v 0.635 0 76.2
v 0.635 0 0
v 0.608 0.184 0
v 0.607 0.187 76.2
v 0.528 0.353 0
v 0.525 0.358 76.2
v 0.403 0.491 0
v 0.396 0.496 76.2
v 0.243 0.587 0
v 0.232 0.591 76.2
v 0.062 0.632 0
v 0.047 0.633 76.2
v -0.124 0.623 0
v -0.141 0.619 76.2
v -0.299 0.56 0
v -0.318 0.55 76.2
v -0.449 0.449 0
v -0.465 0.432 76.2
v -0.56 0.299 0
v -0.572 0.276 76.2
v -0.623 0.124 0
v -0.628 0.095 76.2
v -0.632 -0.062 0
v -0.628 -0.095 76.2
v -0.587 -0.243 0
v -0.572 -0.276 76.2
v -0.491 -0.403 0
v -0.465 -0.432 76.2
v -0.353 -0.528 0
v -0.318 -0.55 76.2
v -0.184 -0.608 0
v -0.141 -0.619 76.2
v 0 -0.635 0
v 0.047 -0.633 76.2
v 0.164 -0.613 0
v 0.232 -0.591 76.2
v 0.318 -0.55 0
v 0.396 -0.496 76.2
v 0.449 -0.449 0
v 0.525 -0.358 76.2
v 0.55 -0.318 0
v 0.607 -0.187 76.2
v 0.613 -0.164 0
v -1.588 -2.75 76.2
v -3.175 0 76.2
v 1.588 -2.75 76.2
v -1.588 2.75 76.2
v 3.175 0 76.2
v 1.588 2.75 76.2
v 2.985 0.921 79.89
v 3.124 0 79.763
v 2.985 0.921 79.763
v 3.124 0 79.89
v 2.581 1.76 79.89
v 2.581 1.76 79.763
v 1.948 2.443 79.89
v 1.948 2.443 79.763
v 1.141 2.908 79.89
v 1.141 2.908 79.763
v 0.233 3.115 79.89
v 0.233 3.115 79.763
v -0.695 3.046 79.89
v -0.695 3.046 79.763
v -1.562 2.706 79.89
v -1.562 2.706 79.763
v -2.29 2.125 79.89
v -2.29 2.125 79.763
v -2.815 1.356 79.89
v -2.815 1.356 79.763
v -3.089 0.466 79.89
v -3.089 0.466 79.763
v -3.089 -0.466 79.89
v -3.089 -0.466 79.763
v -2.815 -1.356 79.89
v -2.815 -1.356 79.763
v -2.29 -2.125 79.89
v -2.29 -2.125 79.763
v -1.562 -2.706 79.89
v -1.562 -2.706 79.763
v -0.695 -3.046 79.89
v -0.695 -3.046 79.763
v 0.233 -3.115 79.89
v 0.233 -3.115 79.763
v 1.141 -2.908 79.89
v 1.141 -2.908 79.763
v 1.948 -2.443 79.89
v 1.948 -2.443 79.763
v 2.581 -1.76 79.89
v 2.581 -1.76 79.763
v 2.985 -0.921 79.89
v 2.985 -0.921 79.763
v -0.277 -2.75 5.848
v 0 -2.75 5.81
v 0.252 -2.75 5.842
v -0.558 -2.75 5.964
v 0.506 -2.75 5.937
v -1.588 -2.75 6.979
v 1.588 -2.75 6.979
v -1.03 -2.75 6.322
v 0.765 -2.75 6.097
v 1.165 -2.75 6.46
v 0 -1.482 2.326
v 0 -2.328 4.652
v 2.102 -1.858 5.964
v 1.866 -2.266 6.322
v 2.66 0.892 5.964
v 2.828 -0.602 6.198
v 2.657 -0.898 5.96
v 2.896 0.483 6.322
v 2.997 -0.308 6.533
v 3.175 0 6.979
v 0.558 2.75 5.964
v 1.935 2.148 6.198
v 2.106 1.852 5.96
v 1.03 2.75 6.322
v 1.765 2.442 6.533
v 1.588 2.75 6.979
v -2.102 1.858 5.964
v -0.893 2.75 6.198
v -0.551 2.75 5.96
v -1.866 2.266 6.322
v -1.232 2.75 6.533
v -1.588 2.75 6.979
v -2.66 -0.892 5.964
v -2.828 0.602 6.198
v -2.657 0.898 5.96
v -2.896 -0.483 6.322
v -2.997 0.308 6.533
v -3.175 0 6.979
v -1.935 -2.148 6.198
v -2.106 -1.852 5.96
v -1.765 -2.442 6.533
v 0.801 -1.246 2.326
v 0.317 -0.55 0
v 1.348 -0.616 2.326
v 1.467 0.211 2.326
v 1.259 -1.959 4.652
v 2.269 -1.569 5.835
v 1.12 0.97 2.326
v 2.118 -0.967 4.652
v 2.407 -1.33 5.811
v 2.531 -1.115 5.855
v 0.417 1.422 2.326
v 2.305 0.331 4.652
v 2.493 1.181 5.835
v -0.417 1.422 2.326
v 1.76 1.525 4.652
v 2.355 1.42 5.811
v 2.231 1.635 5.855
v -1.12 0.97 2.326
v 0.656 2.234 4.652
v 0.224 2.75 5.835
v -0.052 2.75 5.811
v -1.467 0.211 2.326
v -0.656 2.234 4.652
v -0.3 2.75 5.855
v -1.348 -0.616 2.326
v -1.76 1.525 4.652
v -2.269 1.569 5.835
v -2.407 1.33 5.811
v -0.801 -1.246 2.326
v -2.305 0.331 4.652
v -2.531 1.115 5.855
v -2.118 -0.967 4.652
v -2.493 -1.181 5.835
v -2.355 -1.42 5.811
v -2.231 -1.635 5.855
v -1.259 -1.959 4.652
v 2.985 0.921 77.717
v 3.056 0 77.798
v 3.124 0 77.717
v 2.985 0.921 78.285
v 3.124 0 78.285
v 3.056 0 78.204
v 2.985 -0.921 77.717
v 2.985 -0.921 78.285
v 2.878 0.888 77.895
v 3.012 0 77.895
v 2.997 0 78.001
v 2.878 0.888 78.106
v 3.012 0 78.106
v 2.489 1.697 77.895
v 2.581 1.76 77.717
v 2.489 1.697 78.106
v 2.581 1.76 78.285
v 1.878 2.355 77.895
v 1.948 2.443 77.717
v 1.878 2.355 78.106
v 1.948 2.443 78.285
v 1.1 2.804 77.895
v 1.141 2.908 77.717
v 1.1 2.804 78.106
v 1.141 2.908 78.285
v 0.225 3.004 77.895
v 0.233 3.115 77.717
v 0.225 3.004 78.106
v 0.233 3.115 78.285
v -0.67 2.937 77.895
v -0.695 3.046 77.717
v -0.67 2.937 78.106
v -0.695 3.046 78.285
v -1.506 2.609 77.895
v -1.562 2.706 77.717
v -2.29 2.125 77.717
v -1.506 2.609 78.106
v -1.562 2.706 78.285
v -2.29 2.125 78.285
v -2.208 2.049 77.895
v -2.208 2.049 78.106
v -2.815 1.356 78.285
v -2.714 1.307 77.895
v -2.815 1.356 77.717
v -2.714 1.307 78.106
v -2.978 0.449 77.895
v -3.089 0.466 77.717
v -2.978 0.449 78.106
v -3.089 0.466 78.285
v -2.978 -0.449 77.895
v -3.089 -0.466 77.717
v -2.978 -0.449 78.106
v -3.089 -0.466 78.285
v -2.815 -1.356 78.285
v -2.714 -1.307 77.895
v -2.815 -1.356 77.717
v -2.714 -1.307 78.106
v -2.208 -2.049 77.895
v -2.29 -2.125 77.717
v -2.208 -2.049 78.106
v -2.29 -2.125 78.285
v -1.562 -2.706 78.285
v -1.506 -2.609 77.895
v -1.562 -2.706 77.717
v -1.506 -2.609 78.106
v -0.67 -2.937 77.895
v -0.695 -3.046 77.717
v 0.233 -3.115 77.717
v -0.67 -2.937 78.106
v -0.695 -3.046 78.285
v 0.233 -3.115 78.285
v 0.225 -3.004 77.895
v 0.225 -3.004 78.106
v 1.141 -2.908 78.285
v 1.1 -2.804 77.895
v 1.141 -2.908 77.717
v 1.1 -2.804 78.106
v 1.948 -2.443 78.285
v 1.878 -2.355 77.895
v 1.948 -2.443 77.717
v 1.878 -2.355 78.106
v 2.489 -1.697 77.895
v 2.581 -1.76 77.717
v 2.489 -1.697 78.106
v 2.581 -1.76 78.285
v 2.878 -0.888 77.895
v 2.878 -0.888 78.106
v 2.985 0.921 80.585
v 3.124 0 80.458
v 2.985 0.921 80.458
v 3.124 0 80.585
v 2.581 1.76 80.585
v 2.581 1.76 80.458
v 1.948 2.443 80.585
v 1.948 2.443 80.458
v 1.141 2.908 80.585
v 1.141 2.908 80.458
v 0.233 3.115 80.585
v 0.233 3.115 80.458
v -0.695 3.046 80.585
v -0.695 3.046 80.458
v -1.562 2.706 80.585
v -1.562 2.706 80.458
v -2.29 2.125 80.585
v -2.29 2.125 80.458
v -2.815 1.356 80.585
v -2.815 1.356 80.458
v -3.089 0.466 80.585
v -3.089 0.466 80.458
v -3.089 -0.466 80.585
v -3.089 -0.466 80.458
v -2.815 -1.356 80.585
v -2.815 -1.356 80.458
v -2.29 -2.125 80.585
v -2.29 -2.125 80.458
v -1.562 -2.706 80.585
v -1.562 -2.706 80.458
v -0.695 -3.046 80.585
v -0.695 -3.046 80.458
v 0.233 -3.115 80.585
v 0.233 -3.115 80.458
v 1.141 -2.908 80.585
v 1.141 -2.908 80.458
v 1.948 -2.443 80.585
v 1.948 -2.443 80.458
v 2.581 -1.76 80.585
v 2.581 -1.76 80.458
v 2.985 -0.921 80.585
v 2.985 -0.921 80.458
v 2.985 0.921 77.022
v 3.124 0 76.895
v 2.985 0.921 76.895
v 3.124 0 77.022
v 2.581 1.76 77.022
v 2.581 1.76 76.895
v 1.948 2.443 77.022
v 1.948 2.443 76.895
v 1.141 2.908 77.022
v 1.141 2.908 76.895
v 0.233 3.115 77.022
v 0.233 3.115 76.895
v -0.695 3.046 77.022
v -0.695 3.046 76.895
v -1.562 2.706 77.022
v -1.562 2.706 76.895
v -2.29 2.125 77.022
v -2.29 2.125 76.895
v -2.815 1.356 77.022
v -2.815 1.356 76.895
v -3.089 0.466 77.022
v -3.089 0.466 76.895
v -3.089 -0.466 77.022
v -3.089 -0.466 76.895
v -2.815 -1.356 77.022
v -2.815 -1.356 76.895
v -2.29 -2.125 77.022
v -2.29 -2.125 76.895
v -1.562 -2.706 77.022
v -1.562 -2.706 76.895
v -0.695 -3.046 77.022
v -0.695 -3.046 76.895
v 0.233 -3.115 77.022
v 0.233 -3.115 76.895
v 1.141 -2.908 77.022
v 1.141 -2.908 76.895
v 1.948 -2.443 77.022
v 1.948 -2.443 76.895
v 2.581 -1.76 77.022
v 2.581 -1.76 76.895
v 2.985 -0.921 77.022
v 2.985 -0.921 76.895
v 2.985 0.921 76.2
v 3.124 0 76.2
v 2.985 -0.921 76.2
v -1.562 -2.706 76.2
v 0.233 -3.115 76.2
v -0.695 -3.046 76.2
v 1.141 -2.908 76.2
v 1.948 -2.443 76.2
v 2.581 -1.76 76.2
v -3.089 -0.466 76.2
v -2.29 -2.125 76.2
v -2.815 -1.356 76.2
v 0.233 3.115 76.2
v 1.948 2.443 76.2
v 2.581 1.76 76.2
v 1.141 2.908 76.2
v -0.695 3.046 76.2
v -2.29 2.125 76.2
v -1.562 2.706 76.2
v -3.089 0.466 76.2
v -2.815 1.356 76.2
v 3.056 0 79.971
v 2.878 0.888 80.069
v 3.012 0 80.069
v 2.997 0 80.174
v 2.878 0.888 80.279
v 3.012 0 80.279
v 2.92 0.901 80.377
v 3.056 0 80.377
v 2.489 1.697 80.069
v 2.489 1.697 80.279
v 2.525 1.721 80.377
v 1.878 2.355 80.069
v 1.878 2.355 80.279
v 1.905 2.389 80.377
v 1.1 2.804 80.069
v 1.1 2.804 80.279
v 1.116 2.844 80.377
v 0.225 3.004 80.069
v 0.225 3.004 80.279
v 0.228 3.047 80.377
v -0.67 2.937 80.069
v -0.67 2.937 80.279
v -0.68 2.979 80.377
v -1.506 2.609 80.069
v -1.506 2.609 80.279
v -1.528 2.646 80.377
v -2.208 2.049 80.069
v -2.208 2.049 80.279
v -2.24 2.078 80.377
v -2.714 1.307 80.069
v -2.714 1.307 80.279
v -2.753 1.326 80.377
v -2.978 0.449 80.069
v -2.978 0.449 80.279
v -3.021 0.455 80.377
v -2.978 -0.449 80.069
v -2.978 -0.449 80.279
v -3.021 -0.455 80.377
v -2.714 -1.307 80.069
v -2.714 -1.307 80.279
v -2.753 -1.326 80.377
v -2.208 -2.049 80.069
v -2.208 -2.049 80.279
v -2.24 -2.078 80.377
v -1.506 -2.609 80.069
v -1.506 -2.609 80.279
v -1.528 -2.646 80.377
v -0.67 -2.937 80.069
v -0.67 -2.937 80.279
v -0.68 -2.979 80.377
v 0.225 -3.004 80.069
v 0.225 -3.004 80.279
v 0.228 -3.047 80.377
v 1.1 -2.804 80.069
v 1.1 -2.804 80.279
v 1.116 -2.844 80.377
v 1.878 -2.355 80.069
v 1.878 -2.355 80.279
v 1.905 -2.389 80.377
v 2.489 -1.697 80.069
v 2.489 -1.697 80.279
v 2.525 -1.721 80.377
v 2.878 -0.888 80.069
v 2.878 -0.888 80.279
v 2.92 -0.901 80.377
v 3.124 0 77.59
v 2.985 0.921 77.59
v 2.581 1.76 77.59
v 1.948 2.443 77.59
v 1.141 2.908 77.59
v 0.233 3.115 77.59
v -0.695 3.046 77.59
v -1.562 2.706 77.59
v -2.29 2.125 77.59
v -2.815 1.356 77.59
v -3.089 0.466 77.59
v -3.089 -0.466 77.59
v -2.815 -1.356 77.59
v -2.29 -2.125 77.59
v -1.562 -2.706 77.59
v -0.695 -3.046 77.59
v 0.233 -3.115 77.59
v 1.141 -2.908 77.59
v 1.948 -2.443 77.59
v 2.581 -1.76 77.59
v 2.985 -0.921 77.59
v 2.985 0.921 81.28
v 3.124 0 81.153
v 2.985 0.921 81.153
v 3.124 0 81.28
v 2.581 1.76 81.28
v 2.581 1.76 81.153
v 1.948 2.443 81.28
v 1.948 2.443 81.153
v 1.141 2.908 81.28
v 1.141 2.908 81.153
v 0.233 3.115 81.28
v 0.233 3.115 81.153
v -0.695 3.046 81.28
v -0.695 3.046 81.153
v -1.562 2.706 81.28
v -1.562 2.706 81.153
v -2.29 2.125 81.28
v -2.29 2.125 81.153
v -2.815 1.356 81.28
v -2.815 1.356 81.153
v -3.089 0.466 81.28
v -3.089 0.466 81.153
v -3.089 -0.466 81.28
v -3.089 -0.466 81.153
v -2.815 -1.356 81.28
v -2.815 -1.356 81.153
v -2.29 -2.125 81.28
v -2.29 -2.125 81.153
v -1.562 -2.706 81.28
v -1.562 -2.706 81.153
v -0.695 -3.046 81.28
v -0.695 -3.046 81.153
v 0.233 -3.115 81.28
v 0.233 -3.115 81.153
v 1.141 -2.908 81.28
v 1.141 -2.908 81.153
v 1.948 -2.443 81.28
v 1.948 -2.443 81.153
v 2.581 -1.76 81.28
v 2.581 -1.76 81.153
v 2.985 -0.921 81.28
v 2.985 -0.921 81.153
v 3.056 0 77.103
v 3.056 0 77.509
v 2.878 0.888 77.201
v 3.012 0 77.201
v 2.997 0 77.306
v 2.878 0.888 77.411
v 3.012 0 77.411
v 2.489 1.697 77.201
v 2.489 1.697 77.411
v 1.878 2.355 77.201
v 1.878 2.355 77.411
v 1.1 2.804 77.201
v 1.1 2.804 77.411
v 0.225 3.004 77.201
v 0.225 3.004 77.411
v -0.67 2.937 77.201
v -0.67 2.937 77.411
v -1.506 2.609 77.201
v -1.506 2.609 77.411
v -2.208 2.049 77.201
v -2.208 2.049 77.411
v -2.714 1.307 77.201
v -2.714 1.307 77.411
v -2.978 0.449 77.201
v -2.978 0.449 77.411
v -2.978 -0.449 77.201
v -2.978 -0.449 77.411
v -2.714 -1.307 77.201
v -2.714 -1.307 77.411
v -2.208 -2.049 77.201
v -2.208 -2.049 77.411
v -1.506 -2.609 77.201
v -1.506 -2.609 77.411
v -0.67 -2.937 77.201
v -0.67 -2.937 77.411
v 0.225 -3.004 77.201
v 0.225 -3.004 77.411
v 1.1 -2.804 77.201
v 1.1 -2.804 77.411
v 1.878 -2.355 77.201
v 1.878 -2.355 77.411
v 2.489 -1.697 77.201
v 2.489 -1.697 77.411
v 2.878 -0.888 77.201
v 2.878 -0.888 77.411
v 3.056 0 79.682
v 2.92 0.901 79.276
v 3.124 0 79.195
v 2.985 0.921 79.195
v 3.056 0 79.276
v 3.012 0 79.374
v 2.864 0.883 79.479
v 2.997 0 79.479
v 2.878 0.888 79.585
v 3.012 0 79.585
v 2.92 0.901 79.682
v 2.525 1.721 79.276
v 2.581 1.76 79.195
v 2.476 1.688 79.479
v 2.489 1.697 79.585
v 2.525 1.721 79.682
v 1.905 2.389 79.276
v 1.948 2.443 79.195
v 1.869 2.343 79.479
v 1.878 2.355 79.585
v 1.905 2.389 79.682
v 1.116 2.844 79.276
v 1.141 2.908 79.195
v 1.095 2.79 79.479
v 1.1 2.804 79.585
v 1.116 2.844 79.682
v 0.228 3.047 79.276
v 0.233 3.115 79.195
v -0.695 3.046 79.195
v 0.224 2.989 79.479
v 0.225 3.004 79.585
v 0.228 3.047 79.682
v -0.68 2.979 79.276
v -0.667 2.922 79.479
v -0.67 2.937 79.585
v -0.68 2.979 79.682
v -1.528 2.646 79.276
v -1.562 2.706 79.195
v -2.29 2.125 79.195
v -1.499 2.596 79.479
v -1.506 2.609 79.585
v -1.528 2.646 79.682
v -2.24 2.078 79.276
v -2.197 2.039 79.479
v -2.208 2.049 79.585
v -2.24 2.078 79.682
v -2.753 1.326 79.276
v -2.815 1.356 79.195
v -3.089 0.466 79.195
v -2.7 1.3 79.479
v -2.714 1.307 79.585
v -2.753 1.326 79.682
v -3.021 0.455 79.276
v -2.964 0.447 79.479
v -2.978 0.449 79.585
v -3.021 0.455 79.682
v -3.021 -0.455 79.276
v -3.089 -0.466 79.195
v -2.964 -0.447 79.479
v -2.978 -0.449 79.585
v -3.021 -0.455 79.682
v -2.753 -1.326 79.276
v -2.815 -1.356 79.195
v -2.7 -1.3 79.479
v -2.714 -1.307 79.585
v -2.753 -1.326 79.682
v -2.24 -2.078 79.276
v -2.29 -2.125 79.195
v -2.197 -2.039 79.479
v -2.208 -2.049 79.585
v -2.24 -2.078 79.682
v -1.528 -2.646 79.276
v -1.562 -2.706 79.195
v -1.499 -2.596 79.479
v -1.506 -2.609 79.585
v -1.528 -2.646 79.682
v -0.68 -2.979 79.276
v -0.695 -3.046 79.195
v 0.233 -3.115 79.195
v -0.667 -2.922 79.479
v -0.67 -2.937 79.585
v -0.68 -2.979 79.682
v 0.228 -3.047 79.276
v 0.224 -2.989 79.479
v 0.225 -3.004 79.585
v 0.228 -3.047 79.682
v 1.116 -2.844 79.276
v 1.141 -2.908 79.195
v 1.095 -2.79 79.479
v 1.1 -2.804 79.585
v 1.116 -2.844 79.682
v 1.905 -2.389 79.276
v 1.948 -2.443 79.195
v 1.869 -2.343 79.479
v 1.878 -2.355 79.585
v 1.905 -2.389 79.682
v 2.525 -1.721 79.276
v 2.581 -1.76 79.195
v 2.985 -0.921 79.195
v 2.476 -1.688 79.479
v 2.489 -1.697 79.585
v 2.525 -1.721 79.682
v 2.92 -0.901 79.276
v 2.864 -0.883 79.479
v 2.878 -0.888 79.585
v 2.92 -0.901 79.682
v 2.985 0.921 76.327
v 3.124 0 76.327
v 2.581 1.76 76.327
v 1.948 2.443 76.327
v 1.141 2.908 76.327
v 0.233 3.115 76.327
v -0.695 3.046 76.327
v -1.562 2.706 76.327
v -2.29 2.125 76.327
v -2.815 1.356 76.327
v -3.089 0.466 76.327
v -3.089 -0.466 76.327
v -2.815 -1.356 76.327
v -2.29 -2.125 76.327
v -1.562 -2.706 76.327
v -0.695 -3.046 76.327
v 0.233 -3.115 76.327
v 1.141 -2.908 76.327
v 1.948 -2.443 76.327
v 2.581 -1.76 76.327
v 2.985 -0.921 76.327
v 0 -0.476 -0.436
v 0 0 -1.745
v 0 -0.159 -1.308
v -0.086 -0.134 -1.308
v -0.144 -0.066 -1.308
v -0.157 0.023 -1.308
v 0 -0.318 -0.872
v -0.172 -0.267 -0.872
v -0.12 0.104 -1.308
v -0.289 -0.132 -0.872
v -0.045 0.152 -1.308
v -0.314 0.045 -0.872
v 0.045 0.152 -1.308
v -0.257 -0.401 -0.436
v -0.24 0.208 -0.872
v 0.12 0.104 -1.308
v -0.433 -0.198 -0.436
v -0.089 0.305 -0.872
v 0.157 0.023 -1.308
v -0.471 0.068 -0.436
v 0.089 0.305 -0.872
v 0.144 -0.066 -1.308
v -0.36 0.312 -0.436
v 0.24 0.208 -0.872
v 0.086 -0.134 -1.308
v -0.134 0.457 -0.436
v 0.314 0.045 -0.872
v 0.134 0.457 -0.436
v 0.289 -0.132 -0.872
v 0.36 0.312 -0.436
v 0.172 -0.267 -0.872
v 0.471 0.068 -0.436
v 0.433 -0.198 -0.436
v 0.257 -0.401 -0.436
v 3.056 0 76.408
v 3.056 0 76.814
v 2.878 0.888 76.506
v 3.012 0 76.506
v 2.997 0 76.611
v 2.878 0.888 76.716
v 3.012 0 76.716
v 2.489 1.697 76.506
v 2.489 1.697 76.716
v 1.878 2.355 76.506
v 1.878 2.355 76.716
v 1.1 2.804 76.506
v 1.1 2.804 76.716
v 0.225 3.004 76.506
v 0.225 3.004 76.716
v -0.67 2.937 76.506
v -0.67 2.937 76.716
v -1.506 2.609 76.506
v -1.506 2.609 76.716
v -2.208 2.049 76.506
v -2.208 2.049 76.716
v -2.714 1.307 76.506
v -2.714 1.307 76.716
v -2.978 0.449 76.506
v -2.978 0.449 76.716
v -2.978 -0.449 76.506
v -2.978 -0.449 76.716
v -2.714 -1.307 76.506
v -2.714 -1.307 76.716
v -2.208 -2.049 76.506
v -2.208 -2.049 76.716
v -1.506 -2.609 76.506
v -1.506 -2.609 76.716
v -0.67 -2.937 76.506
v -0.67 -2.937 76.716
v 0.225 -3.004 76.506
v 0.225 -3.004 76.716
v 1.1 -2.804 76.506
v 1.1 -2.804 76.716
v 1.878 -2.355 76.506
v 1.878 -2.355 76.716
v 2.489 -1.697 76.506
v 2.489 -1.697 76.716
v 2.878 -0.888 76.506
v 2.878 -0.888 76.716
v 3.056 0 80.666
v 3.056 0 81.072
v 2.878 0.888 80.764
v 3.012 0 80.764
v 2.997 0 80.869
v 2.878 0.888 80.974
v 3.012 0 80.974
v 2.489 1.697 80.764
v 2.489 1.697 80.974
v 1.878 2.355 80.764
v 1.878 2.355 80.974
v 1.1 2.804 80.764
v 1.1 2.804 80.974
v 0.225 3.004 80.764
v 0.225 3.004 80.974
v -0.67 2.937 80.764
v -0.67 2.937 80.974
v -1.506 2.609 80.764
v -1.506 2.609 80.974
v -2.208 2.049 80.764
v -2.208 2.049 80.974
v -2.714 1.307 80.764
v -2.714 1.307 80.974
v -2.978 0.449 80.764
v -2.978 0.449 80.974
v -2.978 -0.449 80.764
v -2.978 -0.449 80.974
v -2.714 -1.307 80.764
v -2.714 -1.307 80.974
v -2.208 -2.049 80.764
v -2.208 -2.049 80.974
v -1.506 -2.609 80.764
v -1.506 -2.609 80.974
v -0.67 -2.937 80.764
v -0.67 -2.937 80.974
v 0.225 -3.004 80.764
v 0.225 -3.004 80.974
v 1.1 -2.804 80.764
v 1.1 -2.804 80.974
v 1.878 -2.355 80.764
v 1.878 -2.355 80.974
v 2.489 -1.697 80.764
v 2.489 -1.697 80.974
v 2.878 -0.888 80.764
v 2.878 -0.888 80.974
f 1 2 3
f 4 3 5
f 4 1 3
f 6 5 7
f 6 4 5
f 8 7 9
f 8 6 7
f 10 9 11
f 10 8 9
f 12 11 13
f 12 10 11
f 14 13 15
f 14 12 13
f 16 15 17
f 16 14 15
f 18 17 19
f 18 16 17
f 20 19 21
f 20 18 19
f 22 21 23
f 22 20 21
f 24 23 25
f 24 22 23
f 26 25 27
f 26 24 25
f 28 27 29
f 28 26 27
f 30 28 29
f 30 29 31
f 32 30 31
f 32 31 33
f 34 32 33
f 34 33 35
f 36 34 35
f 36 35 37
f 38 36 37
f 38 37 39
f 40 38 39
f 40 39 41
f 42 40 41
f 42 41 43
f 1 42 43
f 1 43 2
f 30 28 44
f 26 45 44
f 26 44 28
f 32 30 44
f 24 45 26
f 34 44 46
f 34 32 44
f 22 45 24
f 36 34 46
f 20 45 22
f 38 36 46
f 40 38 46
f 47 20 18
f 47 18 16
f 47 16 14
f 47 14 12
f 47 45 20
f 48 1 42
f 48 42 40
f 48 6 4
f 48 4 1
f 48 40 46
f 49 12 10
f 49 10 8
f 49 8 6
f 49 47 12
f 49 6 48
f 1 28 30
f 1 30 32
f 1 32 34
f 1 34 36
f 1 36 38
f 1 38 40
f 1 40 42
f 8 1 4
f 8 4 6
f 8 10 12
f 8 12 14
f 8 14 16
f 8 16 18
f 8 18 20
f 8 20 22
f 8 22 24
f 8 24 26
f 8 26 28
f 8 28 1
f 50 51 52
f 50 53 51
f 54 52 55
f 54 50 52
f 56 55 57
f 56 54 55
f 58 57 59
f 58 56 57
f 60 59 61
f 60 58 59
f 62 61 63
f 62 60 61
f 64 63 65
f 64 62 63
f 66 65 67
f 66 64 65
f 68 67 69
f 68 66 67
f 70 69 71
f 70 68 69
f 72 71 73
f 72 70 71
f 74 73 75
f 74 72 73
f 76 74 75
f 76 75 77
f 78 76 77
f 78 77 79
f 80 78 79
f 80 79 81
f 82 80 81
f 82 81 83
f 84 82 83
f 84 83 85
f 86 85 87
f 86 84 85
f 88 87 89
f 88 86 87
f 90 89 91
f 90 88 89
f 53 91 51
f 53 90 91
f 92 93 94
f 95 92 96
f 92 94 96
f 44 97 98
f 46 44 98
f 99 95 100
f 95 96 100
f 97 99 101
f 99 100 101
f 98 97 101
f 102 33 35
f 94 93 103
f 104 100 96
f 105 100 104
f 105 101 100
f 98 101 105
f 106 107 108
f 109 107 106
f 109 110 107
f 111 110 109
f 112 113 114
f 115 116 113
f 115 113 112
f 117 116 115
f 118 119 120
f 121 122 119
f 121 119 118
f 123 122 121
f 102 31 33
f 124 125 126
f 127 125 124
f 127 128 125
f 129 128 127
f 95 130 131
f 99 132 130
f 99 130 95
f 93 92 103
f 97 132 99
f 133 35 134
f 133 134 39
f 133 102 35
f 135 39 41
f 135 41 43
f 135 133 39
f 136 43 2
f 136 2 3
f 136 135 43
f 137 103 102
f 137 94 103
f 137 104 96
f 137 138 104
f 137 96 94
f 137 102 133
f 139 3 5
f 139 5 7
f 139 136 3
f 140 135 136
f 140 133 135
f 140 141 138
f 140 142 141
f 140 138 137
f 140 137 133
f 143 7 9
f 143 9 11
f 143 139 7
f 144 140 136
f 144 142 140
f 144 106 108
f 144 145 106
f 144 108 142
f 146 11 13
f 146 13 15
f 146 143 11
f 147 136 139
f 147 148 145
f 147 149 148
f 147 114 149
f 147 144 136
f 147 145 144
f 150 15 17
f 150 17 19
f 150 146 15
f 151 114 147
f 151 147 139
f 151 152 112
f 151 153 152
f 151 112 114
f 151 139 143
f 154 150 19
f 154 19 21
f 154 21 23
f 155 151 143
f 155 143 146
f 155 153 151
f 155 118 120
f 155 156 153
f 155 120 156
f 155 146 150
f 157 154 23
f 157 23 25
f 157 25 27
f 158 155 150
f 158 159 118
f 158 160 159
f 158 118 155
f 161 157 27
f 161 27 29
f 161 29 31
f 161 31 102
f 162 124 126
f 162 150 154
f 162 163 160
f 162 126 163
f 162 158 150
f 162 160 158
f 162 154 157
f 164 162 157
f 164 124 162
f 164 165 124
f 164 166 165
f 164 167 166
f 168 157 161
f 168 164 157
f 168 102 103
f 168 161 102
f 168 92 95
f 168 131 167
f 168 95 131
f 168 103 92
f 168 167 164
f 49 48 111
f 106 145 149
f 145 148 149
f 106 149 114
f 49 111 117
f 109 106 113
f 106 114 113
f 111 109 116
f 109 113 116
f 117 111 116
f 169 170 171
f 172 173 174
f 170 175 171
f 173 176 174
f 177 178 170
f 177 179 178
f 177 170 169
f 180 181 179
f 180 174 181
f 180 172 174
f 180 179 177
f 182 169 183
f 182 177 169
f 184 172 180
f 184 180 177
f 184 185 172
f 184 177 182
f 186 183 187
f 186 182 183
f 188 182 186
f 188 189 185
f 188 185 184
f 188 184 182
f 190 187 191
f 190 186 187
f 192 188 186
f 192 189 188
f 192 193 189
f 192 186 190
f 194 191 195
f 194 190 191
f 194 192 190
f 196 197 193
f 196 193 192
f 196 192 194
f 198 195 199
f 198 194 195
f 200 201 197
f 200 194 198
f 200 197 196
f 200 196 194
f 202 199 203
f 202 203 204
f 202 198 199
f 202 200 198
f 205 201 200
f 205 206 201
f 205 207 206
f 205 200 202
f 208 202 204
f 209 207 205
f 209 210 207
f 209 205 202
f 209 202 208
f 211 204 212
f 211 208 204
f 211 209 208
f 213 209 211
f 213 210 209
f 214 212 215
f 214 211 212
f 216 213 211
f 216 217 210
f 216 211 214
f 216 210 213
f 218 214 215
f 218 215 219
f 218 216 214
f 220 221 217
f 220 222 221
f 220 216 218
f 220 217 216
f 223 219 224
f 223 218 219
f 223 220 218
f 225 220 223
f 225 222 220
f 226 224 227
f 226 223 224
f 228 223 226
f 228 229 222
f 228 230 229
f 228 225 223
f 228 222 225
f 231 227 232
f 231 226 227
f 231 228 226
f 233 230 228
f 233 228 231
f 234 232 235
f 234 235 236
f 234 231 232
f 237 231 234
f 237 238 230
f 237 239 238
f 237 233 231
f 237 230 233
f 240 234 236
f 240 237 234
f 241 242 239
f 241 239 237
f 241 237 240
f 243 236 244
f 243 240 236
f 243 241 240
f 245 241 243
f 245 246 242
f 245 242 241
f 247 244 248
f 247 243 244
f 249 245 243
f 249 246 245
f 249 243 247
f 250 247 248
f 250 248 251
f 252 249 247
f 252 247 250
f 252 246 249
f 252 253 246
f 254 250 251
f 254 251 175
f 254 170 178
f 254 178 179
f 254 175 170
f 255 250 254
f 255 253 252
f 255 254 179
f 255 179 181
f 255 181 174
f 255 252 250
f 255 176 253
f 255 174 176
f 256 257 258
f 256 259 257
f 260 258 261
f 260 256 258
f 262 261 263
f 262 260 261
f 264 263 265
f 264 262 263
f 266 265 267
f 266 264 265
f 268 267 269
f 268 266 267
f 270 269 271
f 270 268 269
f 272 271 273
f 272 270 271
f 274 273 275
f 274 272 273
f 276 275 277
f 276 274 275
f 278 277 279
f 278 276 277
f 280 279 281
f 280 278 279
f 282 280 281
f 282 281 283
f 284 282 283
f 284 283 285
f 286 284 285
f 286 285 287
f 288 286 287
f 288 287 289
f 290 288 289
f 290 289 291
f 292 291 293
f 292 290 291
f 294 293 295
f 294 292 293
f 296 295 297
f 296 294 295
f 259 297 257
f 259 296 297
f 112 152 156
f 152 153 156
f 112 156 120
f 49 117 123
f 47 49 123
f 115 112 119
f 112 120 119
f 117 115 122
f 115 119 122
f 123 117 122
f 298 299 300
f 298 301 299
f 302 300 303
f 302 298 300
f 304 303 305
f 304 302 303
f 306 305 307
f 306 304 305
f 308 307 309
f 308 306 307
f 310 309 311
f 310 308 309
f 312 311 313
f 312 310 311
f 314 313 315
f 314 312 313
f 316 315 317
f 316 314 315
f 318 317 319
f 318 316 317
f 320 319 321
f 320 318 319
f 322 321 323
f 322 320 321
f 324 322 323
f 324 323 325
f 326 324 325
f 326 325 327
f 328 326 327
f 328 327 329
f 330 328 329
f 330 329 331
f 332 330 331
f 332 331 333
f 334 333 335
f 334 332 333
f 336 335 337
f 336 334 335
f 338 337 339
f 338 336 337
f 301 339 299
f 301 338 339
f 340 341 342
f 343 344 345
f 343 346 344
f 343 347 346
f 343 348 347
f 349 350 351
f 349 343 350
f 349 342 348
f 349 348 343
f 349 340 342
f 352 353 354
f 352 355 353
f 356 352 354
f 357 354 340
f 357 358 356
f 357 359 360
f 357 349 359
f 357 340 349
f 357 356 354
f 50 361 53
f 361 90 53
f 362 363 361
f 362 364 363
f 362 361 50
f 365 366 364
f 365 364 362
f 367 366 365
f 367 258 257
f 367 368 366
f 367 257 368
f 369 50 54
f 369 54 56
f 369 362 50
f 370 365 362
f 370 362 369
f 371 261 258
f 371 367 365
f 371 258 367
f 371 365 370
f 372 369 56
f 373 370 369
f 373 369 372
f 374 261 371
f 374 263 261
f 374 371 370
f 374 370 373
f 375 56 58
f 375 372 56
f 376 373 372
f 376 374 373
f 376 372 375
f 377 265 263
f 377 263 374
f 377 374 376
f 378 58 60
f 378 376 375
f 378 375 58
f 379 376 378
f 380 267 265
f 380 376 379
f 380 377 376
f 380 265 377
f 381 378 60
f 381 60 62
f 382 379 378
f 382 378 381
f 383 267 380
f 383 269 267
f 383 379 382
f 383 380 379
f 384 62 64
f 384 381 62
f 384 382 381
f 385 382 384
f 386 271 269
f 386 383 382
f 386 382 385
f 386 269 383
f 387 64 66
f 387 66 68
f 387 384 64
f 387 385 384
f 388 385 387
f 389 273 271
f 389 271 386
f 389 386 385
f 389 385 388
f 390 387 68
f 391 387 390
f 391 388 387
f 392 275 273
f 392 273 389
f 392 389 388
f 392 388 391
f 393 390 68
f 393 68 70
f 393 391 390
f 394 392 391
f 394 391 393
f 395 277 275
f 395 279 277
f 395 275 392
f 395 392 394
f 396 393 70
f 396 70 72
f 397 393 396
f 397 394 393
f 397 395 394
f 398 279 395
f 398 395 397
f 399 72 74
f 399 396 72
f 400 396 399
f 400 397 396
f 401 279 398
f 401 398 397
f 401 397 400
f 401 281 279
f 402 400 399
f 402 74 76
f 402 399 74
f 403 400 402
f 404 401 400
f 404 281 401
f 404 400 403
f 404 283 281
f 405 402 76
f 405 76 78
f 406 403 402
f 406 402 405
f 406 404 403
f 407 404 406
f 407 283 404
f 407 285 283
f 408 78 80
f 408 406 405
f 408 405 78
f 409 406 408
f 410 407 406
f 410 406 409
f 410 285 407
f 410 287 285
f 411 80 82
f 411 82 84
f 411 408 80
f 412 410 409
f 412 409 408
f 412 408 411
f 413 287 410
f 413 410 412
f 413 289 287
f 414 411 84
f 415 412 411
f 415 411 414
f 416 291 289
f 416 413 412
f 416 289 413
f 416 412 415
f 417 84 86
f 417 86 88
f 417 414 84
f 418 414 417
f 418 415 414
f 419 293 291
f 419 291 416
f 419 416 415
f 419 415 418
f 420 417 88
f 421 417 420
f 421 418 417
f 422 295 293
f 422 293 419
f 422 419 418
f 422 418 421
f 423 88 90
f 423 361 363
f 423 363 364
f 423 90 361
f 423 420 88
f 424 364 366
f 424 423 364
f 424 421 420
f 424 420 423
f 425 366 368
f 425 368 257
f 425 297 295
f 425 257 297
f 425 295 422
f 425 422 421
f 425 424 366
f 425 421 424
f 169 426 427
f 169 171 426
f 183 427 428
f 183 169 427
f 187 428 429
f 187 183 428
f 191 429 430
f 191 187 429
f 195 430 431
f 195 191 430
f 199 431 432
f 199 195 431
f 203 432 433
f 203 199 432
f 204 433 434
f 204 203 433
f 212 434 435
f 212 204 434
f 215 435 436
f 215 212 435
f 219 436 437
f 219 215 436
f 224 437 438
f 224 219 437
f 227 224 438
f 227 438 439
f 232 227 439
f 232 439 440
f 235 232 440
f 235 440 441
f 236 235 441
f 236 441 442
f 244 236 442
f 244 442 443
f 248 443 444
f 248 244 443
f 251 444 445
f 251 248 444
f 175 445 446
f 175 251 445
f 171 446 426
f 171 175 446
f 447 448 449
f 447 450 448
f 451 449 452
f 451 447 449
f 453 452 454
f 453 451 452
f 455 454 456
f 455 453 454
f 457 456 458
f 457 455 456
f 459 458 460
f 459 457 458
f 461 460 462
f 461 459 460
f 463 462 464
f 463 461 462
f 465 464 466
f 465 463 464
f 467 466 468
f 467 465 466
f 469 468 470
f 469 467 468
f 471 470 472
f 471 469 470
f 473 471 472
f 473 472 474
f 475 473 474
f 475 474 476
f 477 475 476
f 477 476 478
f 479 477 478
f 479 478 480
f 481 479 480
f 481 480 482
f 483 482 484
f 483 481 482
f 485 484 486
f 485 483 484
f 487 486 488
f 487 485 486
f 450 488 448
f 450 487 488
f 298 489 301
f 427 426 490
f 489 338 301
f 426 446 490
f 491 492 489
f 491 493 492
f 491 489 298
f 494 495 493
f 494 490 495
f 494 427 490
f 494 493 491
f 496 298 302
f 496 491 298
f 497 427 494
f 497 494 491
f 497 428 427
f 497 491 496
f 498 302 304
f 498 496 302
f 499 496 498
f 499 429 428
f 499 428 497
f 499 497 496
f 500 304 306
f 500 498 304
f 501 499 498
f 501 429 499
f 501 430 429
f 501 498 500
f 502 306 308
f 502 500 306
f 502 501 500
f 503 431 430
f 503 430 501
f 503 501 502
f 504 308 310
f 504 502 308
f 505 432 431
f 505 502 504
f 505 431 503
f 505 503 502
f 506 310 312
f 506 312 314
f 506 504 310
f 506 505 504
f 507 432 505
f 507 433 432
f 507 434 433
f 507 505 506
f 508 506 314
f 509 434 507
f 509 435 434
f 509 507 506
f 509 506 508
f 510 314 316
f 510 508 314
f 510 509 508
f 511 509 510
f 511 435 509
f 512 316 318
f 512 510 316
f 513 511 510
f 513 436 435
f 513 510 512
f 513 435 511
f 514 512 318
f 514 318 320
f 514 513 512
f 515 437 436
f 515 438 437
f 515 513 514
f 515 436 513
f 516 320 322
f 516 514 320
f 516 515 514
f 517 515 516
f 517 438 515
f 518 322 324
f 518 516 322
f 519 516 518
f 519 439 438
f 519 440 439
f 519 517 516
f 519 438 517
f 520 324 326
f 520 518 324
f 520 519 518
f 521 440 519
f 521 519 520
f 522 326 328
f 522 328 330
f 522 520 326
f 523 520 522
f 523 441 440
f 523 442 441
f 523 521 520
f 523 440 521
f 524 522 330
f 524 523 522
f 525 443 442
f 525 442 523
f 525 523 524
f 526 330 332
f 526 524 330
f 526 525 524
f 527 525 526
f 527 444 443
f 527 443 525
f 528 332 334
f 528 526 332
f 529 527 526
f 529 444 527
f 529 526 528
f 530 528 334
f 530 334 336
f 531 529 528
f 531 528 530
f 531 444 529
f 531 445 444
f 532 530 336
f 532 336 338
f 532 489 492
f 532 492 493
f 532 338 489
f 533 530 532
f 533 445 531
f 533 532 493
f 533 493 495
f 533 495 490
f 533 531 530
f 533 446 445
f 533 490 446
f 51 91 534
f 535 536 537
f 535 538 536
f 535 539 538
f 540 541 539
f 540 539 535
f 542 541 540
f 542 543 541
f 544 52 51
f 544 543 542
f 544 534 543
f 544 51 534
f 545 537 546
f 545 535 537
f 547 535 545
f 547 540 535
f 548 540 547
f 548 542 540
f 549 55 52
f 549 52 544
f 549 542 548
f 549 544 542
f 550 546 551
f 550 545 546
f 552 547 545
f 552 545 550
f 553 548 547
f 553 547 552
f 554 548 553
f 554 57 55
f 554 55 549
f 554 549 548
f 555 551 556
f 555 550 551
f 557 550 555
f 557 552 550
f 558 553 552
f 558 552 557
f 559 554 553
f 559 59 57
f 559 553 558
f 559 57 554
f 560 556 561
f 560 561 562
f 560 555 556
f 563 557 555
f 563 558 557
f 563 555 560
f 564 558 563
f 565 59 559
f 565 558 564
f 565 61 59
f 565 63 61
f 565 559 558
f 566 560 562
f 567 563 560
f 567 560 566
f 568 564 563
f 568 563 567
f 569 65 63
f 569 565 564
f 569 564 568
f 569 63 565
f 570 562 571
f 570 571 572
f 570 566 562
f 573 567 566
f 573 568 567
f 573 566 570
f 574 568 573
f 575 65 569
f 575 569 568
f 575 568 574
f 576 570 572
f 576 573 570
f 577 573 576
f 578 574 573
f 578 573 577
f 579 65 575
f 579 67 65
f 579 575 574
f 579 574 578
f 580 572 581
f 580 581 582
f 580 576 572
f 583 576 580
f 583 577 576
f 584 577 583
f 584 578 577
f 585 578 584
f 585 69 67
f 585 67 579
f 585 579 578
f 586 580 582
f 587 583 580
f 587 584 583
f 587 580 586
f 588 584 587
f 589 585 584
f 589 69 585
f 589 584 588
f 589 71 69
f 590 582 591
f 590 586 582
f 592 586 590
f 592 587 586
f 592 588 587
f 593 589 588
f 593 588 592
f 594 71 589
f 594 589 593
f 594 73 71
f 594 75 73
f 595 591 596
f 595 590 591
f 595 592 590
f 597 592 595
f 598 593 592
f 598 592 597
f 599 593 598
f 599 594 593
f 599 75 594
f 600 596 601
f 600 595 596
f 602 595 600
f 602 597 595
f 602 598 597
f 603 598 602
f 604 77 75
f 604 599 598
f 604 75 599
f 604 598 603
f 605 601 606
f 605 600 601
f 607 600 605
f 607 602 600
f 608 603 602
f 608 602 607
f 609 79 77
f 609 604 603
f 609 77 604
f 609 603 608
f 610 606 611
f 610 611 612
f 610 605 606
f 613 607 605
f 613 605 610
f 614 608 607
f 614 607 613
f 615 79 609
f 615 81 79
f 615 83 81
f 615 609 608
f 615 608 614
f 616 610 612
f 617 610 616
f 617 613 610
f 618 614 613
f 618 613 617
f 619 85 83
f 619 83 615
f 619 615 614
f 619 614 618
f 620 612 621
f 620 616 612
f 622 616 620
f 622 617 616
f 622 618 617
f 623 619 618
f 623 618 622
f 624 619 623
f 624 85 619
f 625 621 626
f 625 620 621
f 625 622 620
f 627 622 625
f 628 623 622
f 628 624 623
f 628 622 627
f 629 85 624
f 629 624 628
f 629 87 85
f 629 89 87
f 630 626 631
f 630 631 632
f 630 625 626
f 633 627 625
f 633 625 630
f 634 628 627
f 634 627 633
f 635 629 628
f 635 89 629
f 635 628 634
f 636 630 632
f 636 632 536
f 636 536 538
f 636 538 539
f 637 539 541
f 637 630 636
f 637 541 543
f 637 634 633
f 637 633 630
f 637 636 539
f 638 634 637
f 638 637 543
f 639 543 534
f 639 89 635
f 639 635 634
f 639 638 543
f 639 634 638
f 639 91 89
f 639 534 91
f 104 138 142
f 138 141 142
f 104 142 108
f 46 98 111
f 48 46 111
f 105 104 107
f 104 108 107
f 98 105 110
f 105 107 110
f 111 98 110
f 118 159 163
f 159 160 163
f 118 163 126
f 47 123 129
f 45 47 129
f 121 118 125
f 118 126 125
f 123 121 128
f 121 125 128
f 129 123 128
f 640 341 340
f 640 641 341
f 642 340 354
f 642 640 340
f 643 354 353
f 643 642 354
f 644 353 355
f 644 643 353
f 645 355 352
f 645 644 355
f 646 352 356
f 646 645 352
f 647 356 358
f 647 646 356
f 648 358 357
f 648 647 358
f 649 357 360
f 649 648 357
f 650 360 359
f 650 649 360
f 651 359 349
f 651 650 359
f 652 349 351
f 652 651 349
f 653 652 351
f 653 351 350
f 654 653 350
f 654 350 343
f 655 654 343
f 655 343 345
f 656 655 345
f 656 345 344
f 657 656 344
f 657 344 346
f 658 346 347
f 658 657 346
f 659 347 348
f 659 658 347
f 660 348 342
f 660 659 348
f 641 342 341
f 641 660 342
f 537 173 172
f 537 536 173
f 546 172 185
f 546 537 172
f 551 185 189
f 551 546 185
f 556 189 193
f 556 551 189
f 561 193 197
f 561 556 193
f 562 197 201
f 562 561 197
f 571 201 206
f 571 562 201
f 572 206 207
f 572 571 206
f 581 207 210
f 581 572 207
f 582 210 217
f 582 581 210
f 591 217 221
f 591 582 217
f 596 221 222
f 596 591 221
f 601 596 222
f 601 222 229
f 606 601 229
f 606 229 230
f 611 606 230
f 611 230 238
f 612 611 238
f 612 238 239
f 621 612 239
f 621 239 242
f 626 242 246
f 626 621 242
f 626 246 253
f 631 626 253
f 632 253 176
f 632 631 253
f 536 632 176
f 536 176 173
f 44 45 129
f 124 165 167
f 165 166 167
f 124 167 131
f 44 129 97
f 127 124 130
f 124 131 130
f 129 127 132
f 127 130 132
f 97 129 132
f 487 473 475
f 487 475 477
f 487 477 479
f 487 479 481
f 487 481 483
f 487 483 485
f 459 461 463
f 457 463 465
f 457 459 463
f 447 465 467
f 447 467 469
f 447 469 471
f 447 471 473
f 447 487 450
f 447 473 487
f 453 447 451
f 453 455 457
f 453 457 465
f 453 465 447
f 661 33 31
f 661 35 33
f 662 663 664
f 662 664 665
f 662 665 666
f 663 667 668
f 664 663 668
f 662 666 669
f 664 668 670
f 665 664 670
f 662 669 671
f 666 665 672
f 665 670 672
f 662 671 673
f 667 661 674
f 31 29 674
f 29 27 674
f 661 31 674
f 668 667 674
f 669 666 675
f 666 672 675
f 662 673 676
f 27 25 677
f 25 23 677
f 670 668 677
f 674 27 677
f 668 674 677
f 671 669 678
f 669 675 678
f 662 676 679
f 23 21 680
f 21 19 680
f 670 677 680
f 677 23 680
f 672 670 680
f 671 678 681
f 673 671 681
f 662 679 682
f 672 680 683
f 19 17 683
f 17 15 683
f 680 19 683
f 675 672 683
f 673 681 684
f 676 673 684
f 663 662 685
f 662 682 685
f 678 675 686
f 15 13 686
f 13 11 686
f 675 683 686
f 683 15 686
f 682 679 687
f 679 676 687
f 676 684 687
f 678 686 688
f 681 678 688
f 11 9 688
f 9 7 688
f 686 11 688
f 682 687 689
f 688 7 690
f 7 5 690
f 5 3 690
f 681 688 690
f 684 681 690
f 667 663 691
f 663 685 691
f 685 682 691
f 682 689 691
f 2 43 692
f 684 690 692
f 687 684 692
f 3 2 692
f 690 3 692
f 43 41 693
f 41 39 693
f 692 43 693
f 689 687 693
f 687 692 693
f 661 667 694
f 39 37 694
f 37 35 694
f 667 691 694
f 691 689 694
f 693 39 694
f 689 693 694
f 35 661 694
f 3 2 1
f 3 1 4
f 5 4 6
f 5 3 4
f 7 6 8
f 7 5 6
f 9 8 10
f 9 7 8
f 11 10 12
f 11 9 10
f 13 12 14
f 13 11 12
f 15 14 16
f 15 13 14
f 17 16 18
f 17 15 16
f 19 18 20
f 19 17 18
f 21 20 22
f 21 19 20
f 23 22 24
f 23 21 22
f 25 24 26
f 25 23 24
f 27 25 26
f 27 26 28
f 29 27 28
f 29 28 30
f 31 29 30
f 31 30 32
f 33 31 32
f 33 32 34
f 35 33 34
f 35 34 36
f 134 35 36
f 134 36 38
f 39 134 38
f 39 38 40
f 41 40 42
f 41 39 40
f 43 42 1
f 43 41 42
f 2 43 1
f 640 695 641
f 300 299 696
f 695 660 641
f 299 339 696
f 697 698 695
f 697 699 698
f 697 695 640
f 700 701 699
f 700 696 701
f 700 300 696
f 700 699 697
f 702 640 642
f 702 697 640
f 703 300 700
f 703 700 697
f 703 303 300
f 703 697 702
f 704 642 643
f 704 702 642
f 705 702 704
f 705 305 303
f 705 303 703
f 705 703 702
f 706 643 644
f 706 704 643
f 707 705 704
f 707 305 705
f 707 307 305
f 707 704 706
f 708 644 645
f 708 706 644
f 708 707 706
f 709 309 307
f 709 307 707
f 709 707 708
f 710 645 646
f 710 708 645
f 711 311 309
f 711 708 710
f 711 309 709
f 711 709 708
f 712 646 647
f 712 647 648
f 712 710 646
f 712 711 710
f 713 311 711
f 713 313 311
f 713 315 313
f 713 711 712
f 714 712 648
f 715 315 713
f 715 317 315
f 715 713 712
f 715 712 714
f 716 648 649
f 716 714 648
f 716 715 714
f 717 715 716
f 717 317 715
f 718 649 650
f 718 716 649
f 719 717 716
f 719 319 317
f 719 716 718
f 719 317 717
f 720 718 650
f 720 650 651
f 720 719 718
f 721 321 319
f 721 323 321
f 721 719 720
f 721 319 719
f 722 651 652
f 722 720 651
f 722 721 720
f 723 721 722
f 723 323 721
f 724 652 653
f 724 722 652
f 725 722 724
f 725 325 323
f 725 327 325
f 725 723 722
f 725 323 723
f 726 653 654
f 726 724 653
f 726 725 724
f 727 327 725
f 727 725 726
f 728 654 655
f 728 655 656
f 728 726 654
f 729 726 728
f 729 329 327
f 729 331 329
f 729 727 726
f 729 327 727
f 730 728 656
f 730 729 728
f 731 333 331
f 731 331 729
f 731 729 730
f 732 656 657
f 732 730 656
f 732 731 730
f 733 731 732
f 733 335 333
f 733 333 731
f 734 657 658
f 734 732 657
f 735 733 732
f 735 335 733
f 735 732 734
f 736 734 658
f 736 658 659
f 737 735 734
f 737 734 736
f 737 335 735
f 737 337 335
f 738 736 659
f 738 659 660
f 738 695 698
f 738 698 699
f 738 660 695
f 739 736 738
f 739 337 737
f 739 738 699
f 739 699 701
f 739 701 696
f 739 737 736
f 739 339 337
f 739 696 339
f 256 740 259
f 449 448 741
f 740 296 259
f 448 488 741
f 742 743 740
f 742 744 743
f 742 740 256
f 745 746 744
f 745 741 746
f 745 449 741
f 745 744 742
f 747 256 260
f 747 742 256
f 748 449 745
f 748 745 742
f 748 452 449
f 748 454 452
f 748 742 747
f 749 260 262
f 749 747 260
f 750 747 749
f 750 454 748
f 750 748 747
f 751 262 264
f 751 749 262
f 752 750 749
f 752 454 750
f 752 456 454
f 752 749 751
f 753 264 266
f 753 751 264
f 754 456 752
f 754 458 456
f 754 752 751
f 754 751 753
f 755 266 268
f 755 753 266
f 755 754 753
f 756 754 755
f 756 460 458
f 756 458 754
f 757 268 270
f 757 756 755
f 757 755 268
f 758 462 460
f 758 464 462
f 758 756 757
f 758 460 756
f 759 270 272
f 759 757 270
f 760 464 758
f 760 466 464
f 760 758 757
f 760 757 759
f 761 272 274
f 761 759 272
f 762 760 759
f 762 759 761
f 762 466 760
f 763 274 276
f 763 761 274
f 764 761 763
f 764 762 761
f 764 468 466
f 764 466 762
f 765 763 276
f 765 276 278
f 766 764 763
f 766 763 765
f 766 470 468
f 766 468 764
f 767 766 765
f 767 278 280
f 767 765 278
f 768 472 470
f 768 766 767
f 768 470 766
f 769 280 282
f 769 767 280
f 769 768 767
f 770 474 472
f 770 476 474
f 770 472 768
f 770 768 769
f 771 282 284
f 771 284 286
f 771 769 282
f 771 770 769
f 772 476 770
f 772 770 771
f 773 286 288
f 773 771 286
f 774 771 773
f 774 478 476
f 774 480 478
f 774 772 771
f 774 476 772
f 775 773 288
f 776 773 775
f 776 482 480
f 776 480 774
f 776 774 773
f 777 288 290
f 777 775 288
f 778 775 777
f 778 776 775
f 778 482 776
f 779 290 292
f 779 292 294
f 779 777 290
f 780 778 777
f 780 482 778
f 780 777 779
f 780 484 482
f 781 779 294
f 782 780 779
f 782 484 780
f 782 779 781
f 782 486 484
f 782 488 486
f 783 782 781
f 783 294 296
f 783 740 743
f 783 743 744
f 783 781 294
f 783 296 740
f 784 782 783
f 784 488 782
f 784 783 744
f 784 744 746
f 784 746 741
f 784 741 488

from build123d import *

# Parameters (mm, degrees)
F1_DEPTH = 76.2
F2_R     = 0.635
F3_DEPTH = 76.201
F6_R     = 0.635
F7_DEPTH = 129.54


with BuildPart() as f1:
    # F0 (on Top) → F1 (new body)
    with BuildSketch(Plane.XY):
        Polygon((-1.5875, 2.749630657), (-3.175, 0), (-1.5875, -2.749630657), (1.5875, -2.749630657), (3.175, 0), (1.5875, 2.749630657), align=None)
    extrude(amount=F1_DEPTH)

    # F2 (on Top) → F3 (cut, through all)
    with BuildSketch(Plane.XY):
        Circle(F2_R)
    extrude(amount=F3_DEPTH, mode=Mode.SUBTRACT)

    # F4 (on Right) → F5 (revolve, cut)
    with BuildSketch(Plane.YZ):
        Polygon((-0.635, 0), (-5.2574219752, 12.7), (-5.2574219752, 0), align=None)
    revolve(axis=Axis((0, 0, 6.35), (0, 0, 1)), mode=Mode.SUBTRACT)


with BuildPart() as f7:
    # F6 (on face) → F7 (new body)
    with BuildSketch(Plane.XY.offset(76.2)):
        Circle(F6_R)
    extrude(amount=-F7_DEPTH)

    # F8 (on Right) → F9 (revolve, cut)
    with BuildSketch(Plane.YZ):
        Polygon((0, -1.7446481614), (-0.635, 0), (-0.635, -53.34), (0, -53.34), align=None)
    revolve(axis=Axis((0, 0, -26.67), (0, 0, -1)), mode=Mode.SUBTRACT)


with BuildPart() as f11:
    # F10 (on Front) → F11 (revolve)
    with BuildSketch(Plane.XZ):
        with BuildLine():
            Line((0, 81.28), (0, 76.2))
            Line((0, 76.2), (3.1242, 76.2))
            Line((3.1242, 76.2), (3.1242, 76.327))
            ThreePointArc((3.1242, 76.327), (2.9972, 76.6109806331), (3.1242, 76.8949612663))
            Line((3.1242, 76.8949612663), (3.1242, 77.0219612663))
            ThreePointArc((3.1242, 77.0219612663), (2.9972, 77.3059418994), (3.1242, 77.5899225326))
            Line((3.1242, 77.5899225326), (3.1242, 77.7169225326))
            ThreePointArc((3.1242, 77.7169225326), (2.9972, 78.0009031657), (3.1242, 78.2848837989))
            Line((3.1242, 78.2848837989), (3.1242, 79.1951162011))
            ThreePointArc((3.1242, 79.1951162011), (2.9972, 79.4790968343), (3.1242, 79.7630774674))
            Line((3.1242, 79.7630774674), (3.1242, 79.8900774674))
            ThreePointArc((3.1242, 79.8900774674), (2.9972, 80.1740581006), (3.1242, 80.4580387337))
            Line((3.1242, 80.4580387337), (3.1242, 80.5850387337))
            ThreePointArc((3.1242, 80.5850387337), (2.9972, 80.8690193669), (3.1242, 81.153))
            Line((3.1242, 81.153), (3.1242, 81.28))
            Line((3.1242, 81.28), (0, 81.28))
        make_face()
    revolve(axis=Axis((0, 0, 105.6698518753), (0, 0, 1)))


solid = Compound([f1.part, f7.part, f11.part])
